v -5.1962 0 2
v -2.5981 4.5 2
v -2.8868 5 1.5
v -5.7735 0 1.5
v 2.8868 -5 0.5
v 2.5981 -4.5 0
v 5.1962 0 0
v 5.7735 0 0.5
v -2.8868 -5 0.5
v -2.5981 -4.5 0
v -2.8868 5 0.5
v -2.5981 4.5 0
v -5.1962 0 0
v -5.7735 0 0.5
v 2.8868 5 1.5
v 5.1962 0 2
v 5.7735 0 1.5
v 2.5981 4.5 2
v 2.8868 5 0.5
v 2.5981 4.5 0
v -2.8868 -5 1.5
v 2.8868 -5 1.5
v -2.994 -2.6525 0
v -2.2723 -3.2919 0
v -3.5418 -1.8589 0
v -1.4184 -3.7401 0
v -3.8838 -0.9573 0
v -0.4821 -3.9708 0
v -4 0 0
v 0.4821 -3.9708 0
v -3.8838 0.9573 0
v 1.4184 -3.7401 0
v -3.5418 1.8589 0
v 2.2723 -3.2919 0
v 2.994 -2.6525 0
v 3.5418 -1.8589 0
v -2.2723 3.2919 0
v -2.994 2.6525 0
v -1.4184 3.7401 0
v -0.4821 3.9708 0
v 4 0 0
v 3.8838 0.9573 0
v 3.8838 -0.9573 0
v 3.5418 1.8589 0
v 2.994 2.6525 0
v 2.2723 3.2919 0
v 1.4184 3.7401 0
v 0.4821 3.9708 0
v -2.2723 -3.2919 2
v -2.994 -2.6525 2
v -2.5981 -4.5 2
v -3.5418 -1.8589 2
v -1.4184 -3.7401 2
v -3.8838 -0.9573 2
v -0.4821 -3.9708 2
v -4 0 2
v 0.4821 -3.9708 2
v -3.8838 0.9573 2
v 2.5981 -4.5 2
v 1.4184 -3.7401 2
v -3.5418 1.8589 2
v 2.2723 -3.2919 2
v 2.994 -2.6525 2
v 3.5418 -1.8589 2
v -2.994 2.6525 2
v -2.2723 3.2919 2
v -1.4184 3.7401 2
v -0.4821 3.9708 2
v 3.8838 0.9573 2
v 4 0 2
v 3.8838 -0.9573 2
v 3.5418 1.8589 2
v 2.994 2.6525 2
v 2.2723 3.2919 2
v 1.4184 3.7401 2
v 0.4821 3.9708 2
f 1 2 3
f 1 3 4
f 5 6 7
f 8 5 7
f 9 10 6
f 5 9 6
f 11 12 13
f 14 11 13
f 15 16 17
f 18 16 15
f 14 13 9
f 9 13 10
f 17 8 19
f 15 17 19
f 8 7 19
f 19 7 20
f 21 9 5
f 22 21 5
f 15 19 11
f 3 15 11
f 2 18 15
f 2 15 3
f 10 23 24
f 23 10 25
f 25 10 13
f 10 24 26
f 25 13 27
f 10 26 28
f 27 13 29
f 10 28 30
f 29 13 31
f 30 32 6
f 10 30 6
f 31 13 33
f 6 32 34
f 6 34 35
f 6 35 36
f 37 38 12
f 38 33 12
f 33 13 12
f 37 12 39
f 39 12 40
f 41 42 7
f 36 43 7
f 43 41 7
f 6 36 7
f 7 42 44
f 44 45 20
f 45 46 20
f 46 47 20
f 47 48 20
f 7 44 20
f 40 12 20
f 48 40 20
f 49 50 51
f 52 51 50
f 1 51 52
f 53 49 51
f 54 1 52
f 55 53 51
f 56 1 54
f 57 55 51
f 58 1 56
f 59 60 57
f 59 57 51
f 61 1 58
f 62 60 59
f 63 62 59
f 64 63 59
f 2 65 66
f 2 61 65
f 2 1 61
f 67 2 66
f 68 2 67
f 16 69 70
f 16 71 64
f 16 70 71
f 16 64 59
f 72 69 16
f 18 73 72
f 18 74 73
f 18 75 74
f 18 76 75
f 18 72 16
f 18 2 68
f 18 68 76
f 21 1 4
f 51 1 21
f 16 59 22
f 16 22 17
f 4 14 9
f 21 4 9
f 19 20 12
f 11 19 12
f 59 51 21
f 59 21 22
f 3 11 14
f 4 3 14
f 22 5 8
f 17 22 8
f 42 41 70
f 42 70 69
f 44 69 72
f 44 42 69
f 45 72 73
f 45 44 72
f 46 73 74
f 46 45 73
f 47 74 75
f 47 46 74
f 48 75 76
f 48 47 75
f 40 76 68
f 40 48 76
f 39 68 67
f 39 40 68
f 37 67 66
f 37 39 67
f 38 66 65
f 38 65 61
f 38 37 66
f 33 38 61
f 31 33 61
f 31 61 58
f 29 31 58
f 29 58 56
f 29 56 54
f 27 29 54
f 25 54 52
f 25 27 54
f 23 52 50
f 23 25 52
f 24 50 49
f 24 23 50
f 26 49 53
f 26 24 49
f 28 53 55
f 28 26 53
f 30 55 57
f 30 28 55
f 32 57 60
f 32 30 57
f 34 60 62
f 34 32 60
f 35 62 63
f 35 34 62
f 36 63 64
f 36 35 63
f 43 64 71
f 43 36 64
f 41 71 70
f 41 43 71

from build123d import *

# Parameters (mm, degrees)
SKETCH1_R           = 4
BOSS_EXTRUDE1_DEPTH = 2
CHAMFER1_SIZE       = 0.5


with BuildPart() as part:
    # Sketch1 → Boss-Extrude1 (new body)
    with BuildSketch(Plane.XY):
        Polygon((2.886751346, 5), (-2.886751346, 5), (-5.773502692, 0), (-2.886751346, -5), (2.886751346, -5), (5.773502692, 0), align=None)
        Circle(SKETCH1_R, mode=Mode.SUBTRACT)
    extrude(amount=BOSS_EXTRUDE1_DEPTH)

    # Chamfer1
    chamfer1_edges = [part.edges().sort_by_distance(p)[0] for p in [
        (-4.330127019, 2.5, 2),
        (-4.330127019, -2.5, 2),
        (0, -5, 2),
        (4.330127019, -2.5, 2),
        (4.330127019, 2.5, 2),
        (4.330127019, -2.5, 0),
        (0, -5, 0),
        (-4.330127019, -2.5, 0),
        (-4.330127019, 2.5, 0),
        (0, 5, 0),
        (4.330127019, 2.5, 0),
        (0, 5, 2),
    ]]
    chamfer(chamfer1_edges, length=CHAMFER1_SIZE)


solid = part.part
